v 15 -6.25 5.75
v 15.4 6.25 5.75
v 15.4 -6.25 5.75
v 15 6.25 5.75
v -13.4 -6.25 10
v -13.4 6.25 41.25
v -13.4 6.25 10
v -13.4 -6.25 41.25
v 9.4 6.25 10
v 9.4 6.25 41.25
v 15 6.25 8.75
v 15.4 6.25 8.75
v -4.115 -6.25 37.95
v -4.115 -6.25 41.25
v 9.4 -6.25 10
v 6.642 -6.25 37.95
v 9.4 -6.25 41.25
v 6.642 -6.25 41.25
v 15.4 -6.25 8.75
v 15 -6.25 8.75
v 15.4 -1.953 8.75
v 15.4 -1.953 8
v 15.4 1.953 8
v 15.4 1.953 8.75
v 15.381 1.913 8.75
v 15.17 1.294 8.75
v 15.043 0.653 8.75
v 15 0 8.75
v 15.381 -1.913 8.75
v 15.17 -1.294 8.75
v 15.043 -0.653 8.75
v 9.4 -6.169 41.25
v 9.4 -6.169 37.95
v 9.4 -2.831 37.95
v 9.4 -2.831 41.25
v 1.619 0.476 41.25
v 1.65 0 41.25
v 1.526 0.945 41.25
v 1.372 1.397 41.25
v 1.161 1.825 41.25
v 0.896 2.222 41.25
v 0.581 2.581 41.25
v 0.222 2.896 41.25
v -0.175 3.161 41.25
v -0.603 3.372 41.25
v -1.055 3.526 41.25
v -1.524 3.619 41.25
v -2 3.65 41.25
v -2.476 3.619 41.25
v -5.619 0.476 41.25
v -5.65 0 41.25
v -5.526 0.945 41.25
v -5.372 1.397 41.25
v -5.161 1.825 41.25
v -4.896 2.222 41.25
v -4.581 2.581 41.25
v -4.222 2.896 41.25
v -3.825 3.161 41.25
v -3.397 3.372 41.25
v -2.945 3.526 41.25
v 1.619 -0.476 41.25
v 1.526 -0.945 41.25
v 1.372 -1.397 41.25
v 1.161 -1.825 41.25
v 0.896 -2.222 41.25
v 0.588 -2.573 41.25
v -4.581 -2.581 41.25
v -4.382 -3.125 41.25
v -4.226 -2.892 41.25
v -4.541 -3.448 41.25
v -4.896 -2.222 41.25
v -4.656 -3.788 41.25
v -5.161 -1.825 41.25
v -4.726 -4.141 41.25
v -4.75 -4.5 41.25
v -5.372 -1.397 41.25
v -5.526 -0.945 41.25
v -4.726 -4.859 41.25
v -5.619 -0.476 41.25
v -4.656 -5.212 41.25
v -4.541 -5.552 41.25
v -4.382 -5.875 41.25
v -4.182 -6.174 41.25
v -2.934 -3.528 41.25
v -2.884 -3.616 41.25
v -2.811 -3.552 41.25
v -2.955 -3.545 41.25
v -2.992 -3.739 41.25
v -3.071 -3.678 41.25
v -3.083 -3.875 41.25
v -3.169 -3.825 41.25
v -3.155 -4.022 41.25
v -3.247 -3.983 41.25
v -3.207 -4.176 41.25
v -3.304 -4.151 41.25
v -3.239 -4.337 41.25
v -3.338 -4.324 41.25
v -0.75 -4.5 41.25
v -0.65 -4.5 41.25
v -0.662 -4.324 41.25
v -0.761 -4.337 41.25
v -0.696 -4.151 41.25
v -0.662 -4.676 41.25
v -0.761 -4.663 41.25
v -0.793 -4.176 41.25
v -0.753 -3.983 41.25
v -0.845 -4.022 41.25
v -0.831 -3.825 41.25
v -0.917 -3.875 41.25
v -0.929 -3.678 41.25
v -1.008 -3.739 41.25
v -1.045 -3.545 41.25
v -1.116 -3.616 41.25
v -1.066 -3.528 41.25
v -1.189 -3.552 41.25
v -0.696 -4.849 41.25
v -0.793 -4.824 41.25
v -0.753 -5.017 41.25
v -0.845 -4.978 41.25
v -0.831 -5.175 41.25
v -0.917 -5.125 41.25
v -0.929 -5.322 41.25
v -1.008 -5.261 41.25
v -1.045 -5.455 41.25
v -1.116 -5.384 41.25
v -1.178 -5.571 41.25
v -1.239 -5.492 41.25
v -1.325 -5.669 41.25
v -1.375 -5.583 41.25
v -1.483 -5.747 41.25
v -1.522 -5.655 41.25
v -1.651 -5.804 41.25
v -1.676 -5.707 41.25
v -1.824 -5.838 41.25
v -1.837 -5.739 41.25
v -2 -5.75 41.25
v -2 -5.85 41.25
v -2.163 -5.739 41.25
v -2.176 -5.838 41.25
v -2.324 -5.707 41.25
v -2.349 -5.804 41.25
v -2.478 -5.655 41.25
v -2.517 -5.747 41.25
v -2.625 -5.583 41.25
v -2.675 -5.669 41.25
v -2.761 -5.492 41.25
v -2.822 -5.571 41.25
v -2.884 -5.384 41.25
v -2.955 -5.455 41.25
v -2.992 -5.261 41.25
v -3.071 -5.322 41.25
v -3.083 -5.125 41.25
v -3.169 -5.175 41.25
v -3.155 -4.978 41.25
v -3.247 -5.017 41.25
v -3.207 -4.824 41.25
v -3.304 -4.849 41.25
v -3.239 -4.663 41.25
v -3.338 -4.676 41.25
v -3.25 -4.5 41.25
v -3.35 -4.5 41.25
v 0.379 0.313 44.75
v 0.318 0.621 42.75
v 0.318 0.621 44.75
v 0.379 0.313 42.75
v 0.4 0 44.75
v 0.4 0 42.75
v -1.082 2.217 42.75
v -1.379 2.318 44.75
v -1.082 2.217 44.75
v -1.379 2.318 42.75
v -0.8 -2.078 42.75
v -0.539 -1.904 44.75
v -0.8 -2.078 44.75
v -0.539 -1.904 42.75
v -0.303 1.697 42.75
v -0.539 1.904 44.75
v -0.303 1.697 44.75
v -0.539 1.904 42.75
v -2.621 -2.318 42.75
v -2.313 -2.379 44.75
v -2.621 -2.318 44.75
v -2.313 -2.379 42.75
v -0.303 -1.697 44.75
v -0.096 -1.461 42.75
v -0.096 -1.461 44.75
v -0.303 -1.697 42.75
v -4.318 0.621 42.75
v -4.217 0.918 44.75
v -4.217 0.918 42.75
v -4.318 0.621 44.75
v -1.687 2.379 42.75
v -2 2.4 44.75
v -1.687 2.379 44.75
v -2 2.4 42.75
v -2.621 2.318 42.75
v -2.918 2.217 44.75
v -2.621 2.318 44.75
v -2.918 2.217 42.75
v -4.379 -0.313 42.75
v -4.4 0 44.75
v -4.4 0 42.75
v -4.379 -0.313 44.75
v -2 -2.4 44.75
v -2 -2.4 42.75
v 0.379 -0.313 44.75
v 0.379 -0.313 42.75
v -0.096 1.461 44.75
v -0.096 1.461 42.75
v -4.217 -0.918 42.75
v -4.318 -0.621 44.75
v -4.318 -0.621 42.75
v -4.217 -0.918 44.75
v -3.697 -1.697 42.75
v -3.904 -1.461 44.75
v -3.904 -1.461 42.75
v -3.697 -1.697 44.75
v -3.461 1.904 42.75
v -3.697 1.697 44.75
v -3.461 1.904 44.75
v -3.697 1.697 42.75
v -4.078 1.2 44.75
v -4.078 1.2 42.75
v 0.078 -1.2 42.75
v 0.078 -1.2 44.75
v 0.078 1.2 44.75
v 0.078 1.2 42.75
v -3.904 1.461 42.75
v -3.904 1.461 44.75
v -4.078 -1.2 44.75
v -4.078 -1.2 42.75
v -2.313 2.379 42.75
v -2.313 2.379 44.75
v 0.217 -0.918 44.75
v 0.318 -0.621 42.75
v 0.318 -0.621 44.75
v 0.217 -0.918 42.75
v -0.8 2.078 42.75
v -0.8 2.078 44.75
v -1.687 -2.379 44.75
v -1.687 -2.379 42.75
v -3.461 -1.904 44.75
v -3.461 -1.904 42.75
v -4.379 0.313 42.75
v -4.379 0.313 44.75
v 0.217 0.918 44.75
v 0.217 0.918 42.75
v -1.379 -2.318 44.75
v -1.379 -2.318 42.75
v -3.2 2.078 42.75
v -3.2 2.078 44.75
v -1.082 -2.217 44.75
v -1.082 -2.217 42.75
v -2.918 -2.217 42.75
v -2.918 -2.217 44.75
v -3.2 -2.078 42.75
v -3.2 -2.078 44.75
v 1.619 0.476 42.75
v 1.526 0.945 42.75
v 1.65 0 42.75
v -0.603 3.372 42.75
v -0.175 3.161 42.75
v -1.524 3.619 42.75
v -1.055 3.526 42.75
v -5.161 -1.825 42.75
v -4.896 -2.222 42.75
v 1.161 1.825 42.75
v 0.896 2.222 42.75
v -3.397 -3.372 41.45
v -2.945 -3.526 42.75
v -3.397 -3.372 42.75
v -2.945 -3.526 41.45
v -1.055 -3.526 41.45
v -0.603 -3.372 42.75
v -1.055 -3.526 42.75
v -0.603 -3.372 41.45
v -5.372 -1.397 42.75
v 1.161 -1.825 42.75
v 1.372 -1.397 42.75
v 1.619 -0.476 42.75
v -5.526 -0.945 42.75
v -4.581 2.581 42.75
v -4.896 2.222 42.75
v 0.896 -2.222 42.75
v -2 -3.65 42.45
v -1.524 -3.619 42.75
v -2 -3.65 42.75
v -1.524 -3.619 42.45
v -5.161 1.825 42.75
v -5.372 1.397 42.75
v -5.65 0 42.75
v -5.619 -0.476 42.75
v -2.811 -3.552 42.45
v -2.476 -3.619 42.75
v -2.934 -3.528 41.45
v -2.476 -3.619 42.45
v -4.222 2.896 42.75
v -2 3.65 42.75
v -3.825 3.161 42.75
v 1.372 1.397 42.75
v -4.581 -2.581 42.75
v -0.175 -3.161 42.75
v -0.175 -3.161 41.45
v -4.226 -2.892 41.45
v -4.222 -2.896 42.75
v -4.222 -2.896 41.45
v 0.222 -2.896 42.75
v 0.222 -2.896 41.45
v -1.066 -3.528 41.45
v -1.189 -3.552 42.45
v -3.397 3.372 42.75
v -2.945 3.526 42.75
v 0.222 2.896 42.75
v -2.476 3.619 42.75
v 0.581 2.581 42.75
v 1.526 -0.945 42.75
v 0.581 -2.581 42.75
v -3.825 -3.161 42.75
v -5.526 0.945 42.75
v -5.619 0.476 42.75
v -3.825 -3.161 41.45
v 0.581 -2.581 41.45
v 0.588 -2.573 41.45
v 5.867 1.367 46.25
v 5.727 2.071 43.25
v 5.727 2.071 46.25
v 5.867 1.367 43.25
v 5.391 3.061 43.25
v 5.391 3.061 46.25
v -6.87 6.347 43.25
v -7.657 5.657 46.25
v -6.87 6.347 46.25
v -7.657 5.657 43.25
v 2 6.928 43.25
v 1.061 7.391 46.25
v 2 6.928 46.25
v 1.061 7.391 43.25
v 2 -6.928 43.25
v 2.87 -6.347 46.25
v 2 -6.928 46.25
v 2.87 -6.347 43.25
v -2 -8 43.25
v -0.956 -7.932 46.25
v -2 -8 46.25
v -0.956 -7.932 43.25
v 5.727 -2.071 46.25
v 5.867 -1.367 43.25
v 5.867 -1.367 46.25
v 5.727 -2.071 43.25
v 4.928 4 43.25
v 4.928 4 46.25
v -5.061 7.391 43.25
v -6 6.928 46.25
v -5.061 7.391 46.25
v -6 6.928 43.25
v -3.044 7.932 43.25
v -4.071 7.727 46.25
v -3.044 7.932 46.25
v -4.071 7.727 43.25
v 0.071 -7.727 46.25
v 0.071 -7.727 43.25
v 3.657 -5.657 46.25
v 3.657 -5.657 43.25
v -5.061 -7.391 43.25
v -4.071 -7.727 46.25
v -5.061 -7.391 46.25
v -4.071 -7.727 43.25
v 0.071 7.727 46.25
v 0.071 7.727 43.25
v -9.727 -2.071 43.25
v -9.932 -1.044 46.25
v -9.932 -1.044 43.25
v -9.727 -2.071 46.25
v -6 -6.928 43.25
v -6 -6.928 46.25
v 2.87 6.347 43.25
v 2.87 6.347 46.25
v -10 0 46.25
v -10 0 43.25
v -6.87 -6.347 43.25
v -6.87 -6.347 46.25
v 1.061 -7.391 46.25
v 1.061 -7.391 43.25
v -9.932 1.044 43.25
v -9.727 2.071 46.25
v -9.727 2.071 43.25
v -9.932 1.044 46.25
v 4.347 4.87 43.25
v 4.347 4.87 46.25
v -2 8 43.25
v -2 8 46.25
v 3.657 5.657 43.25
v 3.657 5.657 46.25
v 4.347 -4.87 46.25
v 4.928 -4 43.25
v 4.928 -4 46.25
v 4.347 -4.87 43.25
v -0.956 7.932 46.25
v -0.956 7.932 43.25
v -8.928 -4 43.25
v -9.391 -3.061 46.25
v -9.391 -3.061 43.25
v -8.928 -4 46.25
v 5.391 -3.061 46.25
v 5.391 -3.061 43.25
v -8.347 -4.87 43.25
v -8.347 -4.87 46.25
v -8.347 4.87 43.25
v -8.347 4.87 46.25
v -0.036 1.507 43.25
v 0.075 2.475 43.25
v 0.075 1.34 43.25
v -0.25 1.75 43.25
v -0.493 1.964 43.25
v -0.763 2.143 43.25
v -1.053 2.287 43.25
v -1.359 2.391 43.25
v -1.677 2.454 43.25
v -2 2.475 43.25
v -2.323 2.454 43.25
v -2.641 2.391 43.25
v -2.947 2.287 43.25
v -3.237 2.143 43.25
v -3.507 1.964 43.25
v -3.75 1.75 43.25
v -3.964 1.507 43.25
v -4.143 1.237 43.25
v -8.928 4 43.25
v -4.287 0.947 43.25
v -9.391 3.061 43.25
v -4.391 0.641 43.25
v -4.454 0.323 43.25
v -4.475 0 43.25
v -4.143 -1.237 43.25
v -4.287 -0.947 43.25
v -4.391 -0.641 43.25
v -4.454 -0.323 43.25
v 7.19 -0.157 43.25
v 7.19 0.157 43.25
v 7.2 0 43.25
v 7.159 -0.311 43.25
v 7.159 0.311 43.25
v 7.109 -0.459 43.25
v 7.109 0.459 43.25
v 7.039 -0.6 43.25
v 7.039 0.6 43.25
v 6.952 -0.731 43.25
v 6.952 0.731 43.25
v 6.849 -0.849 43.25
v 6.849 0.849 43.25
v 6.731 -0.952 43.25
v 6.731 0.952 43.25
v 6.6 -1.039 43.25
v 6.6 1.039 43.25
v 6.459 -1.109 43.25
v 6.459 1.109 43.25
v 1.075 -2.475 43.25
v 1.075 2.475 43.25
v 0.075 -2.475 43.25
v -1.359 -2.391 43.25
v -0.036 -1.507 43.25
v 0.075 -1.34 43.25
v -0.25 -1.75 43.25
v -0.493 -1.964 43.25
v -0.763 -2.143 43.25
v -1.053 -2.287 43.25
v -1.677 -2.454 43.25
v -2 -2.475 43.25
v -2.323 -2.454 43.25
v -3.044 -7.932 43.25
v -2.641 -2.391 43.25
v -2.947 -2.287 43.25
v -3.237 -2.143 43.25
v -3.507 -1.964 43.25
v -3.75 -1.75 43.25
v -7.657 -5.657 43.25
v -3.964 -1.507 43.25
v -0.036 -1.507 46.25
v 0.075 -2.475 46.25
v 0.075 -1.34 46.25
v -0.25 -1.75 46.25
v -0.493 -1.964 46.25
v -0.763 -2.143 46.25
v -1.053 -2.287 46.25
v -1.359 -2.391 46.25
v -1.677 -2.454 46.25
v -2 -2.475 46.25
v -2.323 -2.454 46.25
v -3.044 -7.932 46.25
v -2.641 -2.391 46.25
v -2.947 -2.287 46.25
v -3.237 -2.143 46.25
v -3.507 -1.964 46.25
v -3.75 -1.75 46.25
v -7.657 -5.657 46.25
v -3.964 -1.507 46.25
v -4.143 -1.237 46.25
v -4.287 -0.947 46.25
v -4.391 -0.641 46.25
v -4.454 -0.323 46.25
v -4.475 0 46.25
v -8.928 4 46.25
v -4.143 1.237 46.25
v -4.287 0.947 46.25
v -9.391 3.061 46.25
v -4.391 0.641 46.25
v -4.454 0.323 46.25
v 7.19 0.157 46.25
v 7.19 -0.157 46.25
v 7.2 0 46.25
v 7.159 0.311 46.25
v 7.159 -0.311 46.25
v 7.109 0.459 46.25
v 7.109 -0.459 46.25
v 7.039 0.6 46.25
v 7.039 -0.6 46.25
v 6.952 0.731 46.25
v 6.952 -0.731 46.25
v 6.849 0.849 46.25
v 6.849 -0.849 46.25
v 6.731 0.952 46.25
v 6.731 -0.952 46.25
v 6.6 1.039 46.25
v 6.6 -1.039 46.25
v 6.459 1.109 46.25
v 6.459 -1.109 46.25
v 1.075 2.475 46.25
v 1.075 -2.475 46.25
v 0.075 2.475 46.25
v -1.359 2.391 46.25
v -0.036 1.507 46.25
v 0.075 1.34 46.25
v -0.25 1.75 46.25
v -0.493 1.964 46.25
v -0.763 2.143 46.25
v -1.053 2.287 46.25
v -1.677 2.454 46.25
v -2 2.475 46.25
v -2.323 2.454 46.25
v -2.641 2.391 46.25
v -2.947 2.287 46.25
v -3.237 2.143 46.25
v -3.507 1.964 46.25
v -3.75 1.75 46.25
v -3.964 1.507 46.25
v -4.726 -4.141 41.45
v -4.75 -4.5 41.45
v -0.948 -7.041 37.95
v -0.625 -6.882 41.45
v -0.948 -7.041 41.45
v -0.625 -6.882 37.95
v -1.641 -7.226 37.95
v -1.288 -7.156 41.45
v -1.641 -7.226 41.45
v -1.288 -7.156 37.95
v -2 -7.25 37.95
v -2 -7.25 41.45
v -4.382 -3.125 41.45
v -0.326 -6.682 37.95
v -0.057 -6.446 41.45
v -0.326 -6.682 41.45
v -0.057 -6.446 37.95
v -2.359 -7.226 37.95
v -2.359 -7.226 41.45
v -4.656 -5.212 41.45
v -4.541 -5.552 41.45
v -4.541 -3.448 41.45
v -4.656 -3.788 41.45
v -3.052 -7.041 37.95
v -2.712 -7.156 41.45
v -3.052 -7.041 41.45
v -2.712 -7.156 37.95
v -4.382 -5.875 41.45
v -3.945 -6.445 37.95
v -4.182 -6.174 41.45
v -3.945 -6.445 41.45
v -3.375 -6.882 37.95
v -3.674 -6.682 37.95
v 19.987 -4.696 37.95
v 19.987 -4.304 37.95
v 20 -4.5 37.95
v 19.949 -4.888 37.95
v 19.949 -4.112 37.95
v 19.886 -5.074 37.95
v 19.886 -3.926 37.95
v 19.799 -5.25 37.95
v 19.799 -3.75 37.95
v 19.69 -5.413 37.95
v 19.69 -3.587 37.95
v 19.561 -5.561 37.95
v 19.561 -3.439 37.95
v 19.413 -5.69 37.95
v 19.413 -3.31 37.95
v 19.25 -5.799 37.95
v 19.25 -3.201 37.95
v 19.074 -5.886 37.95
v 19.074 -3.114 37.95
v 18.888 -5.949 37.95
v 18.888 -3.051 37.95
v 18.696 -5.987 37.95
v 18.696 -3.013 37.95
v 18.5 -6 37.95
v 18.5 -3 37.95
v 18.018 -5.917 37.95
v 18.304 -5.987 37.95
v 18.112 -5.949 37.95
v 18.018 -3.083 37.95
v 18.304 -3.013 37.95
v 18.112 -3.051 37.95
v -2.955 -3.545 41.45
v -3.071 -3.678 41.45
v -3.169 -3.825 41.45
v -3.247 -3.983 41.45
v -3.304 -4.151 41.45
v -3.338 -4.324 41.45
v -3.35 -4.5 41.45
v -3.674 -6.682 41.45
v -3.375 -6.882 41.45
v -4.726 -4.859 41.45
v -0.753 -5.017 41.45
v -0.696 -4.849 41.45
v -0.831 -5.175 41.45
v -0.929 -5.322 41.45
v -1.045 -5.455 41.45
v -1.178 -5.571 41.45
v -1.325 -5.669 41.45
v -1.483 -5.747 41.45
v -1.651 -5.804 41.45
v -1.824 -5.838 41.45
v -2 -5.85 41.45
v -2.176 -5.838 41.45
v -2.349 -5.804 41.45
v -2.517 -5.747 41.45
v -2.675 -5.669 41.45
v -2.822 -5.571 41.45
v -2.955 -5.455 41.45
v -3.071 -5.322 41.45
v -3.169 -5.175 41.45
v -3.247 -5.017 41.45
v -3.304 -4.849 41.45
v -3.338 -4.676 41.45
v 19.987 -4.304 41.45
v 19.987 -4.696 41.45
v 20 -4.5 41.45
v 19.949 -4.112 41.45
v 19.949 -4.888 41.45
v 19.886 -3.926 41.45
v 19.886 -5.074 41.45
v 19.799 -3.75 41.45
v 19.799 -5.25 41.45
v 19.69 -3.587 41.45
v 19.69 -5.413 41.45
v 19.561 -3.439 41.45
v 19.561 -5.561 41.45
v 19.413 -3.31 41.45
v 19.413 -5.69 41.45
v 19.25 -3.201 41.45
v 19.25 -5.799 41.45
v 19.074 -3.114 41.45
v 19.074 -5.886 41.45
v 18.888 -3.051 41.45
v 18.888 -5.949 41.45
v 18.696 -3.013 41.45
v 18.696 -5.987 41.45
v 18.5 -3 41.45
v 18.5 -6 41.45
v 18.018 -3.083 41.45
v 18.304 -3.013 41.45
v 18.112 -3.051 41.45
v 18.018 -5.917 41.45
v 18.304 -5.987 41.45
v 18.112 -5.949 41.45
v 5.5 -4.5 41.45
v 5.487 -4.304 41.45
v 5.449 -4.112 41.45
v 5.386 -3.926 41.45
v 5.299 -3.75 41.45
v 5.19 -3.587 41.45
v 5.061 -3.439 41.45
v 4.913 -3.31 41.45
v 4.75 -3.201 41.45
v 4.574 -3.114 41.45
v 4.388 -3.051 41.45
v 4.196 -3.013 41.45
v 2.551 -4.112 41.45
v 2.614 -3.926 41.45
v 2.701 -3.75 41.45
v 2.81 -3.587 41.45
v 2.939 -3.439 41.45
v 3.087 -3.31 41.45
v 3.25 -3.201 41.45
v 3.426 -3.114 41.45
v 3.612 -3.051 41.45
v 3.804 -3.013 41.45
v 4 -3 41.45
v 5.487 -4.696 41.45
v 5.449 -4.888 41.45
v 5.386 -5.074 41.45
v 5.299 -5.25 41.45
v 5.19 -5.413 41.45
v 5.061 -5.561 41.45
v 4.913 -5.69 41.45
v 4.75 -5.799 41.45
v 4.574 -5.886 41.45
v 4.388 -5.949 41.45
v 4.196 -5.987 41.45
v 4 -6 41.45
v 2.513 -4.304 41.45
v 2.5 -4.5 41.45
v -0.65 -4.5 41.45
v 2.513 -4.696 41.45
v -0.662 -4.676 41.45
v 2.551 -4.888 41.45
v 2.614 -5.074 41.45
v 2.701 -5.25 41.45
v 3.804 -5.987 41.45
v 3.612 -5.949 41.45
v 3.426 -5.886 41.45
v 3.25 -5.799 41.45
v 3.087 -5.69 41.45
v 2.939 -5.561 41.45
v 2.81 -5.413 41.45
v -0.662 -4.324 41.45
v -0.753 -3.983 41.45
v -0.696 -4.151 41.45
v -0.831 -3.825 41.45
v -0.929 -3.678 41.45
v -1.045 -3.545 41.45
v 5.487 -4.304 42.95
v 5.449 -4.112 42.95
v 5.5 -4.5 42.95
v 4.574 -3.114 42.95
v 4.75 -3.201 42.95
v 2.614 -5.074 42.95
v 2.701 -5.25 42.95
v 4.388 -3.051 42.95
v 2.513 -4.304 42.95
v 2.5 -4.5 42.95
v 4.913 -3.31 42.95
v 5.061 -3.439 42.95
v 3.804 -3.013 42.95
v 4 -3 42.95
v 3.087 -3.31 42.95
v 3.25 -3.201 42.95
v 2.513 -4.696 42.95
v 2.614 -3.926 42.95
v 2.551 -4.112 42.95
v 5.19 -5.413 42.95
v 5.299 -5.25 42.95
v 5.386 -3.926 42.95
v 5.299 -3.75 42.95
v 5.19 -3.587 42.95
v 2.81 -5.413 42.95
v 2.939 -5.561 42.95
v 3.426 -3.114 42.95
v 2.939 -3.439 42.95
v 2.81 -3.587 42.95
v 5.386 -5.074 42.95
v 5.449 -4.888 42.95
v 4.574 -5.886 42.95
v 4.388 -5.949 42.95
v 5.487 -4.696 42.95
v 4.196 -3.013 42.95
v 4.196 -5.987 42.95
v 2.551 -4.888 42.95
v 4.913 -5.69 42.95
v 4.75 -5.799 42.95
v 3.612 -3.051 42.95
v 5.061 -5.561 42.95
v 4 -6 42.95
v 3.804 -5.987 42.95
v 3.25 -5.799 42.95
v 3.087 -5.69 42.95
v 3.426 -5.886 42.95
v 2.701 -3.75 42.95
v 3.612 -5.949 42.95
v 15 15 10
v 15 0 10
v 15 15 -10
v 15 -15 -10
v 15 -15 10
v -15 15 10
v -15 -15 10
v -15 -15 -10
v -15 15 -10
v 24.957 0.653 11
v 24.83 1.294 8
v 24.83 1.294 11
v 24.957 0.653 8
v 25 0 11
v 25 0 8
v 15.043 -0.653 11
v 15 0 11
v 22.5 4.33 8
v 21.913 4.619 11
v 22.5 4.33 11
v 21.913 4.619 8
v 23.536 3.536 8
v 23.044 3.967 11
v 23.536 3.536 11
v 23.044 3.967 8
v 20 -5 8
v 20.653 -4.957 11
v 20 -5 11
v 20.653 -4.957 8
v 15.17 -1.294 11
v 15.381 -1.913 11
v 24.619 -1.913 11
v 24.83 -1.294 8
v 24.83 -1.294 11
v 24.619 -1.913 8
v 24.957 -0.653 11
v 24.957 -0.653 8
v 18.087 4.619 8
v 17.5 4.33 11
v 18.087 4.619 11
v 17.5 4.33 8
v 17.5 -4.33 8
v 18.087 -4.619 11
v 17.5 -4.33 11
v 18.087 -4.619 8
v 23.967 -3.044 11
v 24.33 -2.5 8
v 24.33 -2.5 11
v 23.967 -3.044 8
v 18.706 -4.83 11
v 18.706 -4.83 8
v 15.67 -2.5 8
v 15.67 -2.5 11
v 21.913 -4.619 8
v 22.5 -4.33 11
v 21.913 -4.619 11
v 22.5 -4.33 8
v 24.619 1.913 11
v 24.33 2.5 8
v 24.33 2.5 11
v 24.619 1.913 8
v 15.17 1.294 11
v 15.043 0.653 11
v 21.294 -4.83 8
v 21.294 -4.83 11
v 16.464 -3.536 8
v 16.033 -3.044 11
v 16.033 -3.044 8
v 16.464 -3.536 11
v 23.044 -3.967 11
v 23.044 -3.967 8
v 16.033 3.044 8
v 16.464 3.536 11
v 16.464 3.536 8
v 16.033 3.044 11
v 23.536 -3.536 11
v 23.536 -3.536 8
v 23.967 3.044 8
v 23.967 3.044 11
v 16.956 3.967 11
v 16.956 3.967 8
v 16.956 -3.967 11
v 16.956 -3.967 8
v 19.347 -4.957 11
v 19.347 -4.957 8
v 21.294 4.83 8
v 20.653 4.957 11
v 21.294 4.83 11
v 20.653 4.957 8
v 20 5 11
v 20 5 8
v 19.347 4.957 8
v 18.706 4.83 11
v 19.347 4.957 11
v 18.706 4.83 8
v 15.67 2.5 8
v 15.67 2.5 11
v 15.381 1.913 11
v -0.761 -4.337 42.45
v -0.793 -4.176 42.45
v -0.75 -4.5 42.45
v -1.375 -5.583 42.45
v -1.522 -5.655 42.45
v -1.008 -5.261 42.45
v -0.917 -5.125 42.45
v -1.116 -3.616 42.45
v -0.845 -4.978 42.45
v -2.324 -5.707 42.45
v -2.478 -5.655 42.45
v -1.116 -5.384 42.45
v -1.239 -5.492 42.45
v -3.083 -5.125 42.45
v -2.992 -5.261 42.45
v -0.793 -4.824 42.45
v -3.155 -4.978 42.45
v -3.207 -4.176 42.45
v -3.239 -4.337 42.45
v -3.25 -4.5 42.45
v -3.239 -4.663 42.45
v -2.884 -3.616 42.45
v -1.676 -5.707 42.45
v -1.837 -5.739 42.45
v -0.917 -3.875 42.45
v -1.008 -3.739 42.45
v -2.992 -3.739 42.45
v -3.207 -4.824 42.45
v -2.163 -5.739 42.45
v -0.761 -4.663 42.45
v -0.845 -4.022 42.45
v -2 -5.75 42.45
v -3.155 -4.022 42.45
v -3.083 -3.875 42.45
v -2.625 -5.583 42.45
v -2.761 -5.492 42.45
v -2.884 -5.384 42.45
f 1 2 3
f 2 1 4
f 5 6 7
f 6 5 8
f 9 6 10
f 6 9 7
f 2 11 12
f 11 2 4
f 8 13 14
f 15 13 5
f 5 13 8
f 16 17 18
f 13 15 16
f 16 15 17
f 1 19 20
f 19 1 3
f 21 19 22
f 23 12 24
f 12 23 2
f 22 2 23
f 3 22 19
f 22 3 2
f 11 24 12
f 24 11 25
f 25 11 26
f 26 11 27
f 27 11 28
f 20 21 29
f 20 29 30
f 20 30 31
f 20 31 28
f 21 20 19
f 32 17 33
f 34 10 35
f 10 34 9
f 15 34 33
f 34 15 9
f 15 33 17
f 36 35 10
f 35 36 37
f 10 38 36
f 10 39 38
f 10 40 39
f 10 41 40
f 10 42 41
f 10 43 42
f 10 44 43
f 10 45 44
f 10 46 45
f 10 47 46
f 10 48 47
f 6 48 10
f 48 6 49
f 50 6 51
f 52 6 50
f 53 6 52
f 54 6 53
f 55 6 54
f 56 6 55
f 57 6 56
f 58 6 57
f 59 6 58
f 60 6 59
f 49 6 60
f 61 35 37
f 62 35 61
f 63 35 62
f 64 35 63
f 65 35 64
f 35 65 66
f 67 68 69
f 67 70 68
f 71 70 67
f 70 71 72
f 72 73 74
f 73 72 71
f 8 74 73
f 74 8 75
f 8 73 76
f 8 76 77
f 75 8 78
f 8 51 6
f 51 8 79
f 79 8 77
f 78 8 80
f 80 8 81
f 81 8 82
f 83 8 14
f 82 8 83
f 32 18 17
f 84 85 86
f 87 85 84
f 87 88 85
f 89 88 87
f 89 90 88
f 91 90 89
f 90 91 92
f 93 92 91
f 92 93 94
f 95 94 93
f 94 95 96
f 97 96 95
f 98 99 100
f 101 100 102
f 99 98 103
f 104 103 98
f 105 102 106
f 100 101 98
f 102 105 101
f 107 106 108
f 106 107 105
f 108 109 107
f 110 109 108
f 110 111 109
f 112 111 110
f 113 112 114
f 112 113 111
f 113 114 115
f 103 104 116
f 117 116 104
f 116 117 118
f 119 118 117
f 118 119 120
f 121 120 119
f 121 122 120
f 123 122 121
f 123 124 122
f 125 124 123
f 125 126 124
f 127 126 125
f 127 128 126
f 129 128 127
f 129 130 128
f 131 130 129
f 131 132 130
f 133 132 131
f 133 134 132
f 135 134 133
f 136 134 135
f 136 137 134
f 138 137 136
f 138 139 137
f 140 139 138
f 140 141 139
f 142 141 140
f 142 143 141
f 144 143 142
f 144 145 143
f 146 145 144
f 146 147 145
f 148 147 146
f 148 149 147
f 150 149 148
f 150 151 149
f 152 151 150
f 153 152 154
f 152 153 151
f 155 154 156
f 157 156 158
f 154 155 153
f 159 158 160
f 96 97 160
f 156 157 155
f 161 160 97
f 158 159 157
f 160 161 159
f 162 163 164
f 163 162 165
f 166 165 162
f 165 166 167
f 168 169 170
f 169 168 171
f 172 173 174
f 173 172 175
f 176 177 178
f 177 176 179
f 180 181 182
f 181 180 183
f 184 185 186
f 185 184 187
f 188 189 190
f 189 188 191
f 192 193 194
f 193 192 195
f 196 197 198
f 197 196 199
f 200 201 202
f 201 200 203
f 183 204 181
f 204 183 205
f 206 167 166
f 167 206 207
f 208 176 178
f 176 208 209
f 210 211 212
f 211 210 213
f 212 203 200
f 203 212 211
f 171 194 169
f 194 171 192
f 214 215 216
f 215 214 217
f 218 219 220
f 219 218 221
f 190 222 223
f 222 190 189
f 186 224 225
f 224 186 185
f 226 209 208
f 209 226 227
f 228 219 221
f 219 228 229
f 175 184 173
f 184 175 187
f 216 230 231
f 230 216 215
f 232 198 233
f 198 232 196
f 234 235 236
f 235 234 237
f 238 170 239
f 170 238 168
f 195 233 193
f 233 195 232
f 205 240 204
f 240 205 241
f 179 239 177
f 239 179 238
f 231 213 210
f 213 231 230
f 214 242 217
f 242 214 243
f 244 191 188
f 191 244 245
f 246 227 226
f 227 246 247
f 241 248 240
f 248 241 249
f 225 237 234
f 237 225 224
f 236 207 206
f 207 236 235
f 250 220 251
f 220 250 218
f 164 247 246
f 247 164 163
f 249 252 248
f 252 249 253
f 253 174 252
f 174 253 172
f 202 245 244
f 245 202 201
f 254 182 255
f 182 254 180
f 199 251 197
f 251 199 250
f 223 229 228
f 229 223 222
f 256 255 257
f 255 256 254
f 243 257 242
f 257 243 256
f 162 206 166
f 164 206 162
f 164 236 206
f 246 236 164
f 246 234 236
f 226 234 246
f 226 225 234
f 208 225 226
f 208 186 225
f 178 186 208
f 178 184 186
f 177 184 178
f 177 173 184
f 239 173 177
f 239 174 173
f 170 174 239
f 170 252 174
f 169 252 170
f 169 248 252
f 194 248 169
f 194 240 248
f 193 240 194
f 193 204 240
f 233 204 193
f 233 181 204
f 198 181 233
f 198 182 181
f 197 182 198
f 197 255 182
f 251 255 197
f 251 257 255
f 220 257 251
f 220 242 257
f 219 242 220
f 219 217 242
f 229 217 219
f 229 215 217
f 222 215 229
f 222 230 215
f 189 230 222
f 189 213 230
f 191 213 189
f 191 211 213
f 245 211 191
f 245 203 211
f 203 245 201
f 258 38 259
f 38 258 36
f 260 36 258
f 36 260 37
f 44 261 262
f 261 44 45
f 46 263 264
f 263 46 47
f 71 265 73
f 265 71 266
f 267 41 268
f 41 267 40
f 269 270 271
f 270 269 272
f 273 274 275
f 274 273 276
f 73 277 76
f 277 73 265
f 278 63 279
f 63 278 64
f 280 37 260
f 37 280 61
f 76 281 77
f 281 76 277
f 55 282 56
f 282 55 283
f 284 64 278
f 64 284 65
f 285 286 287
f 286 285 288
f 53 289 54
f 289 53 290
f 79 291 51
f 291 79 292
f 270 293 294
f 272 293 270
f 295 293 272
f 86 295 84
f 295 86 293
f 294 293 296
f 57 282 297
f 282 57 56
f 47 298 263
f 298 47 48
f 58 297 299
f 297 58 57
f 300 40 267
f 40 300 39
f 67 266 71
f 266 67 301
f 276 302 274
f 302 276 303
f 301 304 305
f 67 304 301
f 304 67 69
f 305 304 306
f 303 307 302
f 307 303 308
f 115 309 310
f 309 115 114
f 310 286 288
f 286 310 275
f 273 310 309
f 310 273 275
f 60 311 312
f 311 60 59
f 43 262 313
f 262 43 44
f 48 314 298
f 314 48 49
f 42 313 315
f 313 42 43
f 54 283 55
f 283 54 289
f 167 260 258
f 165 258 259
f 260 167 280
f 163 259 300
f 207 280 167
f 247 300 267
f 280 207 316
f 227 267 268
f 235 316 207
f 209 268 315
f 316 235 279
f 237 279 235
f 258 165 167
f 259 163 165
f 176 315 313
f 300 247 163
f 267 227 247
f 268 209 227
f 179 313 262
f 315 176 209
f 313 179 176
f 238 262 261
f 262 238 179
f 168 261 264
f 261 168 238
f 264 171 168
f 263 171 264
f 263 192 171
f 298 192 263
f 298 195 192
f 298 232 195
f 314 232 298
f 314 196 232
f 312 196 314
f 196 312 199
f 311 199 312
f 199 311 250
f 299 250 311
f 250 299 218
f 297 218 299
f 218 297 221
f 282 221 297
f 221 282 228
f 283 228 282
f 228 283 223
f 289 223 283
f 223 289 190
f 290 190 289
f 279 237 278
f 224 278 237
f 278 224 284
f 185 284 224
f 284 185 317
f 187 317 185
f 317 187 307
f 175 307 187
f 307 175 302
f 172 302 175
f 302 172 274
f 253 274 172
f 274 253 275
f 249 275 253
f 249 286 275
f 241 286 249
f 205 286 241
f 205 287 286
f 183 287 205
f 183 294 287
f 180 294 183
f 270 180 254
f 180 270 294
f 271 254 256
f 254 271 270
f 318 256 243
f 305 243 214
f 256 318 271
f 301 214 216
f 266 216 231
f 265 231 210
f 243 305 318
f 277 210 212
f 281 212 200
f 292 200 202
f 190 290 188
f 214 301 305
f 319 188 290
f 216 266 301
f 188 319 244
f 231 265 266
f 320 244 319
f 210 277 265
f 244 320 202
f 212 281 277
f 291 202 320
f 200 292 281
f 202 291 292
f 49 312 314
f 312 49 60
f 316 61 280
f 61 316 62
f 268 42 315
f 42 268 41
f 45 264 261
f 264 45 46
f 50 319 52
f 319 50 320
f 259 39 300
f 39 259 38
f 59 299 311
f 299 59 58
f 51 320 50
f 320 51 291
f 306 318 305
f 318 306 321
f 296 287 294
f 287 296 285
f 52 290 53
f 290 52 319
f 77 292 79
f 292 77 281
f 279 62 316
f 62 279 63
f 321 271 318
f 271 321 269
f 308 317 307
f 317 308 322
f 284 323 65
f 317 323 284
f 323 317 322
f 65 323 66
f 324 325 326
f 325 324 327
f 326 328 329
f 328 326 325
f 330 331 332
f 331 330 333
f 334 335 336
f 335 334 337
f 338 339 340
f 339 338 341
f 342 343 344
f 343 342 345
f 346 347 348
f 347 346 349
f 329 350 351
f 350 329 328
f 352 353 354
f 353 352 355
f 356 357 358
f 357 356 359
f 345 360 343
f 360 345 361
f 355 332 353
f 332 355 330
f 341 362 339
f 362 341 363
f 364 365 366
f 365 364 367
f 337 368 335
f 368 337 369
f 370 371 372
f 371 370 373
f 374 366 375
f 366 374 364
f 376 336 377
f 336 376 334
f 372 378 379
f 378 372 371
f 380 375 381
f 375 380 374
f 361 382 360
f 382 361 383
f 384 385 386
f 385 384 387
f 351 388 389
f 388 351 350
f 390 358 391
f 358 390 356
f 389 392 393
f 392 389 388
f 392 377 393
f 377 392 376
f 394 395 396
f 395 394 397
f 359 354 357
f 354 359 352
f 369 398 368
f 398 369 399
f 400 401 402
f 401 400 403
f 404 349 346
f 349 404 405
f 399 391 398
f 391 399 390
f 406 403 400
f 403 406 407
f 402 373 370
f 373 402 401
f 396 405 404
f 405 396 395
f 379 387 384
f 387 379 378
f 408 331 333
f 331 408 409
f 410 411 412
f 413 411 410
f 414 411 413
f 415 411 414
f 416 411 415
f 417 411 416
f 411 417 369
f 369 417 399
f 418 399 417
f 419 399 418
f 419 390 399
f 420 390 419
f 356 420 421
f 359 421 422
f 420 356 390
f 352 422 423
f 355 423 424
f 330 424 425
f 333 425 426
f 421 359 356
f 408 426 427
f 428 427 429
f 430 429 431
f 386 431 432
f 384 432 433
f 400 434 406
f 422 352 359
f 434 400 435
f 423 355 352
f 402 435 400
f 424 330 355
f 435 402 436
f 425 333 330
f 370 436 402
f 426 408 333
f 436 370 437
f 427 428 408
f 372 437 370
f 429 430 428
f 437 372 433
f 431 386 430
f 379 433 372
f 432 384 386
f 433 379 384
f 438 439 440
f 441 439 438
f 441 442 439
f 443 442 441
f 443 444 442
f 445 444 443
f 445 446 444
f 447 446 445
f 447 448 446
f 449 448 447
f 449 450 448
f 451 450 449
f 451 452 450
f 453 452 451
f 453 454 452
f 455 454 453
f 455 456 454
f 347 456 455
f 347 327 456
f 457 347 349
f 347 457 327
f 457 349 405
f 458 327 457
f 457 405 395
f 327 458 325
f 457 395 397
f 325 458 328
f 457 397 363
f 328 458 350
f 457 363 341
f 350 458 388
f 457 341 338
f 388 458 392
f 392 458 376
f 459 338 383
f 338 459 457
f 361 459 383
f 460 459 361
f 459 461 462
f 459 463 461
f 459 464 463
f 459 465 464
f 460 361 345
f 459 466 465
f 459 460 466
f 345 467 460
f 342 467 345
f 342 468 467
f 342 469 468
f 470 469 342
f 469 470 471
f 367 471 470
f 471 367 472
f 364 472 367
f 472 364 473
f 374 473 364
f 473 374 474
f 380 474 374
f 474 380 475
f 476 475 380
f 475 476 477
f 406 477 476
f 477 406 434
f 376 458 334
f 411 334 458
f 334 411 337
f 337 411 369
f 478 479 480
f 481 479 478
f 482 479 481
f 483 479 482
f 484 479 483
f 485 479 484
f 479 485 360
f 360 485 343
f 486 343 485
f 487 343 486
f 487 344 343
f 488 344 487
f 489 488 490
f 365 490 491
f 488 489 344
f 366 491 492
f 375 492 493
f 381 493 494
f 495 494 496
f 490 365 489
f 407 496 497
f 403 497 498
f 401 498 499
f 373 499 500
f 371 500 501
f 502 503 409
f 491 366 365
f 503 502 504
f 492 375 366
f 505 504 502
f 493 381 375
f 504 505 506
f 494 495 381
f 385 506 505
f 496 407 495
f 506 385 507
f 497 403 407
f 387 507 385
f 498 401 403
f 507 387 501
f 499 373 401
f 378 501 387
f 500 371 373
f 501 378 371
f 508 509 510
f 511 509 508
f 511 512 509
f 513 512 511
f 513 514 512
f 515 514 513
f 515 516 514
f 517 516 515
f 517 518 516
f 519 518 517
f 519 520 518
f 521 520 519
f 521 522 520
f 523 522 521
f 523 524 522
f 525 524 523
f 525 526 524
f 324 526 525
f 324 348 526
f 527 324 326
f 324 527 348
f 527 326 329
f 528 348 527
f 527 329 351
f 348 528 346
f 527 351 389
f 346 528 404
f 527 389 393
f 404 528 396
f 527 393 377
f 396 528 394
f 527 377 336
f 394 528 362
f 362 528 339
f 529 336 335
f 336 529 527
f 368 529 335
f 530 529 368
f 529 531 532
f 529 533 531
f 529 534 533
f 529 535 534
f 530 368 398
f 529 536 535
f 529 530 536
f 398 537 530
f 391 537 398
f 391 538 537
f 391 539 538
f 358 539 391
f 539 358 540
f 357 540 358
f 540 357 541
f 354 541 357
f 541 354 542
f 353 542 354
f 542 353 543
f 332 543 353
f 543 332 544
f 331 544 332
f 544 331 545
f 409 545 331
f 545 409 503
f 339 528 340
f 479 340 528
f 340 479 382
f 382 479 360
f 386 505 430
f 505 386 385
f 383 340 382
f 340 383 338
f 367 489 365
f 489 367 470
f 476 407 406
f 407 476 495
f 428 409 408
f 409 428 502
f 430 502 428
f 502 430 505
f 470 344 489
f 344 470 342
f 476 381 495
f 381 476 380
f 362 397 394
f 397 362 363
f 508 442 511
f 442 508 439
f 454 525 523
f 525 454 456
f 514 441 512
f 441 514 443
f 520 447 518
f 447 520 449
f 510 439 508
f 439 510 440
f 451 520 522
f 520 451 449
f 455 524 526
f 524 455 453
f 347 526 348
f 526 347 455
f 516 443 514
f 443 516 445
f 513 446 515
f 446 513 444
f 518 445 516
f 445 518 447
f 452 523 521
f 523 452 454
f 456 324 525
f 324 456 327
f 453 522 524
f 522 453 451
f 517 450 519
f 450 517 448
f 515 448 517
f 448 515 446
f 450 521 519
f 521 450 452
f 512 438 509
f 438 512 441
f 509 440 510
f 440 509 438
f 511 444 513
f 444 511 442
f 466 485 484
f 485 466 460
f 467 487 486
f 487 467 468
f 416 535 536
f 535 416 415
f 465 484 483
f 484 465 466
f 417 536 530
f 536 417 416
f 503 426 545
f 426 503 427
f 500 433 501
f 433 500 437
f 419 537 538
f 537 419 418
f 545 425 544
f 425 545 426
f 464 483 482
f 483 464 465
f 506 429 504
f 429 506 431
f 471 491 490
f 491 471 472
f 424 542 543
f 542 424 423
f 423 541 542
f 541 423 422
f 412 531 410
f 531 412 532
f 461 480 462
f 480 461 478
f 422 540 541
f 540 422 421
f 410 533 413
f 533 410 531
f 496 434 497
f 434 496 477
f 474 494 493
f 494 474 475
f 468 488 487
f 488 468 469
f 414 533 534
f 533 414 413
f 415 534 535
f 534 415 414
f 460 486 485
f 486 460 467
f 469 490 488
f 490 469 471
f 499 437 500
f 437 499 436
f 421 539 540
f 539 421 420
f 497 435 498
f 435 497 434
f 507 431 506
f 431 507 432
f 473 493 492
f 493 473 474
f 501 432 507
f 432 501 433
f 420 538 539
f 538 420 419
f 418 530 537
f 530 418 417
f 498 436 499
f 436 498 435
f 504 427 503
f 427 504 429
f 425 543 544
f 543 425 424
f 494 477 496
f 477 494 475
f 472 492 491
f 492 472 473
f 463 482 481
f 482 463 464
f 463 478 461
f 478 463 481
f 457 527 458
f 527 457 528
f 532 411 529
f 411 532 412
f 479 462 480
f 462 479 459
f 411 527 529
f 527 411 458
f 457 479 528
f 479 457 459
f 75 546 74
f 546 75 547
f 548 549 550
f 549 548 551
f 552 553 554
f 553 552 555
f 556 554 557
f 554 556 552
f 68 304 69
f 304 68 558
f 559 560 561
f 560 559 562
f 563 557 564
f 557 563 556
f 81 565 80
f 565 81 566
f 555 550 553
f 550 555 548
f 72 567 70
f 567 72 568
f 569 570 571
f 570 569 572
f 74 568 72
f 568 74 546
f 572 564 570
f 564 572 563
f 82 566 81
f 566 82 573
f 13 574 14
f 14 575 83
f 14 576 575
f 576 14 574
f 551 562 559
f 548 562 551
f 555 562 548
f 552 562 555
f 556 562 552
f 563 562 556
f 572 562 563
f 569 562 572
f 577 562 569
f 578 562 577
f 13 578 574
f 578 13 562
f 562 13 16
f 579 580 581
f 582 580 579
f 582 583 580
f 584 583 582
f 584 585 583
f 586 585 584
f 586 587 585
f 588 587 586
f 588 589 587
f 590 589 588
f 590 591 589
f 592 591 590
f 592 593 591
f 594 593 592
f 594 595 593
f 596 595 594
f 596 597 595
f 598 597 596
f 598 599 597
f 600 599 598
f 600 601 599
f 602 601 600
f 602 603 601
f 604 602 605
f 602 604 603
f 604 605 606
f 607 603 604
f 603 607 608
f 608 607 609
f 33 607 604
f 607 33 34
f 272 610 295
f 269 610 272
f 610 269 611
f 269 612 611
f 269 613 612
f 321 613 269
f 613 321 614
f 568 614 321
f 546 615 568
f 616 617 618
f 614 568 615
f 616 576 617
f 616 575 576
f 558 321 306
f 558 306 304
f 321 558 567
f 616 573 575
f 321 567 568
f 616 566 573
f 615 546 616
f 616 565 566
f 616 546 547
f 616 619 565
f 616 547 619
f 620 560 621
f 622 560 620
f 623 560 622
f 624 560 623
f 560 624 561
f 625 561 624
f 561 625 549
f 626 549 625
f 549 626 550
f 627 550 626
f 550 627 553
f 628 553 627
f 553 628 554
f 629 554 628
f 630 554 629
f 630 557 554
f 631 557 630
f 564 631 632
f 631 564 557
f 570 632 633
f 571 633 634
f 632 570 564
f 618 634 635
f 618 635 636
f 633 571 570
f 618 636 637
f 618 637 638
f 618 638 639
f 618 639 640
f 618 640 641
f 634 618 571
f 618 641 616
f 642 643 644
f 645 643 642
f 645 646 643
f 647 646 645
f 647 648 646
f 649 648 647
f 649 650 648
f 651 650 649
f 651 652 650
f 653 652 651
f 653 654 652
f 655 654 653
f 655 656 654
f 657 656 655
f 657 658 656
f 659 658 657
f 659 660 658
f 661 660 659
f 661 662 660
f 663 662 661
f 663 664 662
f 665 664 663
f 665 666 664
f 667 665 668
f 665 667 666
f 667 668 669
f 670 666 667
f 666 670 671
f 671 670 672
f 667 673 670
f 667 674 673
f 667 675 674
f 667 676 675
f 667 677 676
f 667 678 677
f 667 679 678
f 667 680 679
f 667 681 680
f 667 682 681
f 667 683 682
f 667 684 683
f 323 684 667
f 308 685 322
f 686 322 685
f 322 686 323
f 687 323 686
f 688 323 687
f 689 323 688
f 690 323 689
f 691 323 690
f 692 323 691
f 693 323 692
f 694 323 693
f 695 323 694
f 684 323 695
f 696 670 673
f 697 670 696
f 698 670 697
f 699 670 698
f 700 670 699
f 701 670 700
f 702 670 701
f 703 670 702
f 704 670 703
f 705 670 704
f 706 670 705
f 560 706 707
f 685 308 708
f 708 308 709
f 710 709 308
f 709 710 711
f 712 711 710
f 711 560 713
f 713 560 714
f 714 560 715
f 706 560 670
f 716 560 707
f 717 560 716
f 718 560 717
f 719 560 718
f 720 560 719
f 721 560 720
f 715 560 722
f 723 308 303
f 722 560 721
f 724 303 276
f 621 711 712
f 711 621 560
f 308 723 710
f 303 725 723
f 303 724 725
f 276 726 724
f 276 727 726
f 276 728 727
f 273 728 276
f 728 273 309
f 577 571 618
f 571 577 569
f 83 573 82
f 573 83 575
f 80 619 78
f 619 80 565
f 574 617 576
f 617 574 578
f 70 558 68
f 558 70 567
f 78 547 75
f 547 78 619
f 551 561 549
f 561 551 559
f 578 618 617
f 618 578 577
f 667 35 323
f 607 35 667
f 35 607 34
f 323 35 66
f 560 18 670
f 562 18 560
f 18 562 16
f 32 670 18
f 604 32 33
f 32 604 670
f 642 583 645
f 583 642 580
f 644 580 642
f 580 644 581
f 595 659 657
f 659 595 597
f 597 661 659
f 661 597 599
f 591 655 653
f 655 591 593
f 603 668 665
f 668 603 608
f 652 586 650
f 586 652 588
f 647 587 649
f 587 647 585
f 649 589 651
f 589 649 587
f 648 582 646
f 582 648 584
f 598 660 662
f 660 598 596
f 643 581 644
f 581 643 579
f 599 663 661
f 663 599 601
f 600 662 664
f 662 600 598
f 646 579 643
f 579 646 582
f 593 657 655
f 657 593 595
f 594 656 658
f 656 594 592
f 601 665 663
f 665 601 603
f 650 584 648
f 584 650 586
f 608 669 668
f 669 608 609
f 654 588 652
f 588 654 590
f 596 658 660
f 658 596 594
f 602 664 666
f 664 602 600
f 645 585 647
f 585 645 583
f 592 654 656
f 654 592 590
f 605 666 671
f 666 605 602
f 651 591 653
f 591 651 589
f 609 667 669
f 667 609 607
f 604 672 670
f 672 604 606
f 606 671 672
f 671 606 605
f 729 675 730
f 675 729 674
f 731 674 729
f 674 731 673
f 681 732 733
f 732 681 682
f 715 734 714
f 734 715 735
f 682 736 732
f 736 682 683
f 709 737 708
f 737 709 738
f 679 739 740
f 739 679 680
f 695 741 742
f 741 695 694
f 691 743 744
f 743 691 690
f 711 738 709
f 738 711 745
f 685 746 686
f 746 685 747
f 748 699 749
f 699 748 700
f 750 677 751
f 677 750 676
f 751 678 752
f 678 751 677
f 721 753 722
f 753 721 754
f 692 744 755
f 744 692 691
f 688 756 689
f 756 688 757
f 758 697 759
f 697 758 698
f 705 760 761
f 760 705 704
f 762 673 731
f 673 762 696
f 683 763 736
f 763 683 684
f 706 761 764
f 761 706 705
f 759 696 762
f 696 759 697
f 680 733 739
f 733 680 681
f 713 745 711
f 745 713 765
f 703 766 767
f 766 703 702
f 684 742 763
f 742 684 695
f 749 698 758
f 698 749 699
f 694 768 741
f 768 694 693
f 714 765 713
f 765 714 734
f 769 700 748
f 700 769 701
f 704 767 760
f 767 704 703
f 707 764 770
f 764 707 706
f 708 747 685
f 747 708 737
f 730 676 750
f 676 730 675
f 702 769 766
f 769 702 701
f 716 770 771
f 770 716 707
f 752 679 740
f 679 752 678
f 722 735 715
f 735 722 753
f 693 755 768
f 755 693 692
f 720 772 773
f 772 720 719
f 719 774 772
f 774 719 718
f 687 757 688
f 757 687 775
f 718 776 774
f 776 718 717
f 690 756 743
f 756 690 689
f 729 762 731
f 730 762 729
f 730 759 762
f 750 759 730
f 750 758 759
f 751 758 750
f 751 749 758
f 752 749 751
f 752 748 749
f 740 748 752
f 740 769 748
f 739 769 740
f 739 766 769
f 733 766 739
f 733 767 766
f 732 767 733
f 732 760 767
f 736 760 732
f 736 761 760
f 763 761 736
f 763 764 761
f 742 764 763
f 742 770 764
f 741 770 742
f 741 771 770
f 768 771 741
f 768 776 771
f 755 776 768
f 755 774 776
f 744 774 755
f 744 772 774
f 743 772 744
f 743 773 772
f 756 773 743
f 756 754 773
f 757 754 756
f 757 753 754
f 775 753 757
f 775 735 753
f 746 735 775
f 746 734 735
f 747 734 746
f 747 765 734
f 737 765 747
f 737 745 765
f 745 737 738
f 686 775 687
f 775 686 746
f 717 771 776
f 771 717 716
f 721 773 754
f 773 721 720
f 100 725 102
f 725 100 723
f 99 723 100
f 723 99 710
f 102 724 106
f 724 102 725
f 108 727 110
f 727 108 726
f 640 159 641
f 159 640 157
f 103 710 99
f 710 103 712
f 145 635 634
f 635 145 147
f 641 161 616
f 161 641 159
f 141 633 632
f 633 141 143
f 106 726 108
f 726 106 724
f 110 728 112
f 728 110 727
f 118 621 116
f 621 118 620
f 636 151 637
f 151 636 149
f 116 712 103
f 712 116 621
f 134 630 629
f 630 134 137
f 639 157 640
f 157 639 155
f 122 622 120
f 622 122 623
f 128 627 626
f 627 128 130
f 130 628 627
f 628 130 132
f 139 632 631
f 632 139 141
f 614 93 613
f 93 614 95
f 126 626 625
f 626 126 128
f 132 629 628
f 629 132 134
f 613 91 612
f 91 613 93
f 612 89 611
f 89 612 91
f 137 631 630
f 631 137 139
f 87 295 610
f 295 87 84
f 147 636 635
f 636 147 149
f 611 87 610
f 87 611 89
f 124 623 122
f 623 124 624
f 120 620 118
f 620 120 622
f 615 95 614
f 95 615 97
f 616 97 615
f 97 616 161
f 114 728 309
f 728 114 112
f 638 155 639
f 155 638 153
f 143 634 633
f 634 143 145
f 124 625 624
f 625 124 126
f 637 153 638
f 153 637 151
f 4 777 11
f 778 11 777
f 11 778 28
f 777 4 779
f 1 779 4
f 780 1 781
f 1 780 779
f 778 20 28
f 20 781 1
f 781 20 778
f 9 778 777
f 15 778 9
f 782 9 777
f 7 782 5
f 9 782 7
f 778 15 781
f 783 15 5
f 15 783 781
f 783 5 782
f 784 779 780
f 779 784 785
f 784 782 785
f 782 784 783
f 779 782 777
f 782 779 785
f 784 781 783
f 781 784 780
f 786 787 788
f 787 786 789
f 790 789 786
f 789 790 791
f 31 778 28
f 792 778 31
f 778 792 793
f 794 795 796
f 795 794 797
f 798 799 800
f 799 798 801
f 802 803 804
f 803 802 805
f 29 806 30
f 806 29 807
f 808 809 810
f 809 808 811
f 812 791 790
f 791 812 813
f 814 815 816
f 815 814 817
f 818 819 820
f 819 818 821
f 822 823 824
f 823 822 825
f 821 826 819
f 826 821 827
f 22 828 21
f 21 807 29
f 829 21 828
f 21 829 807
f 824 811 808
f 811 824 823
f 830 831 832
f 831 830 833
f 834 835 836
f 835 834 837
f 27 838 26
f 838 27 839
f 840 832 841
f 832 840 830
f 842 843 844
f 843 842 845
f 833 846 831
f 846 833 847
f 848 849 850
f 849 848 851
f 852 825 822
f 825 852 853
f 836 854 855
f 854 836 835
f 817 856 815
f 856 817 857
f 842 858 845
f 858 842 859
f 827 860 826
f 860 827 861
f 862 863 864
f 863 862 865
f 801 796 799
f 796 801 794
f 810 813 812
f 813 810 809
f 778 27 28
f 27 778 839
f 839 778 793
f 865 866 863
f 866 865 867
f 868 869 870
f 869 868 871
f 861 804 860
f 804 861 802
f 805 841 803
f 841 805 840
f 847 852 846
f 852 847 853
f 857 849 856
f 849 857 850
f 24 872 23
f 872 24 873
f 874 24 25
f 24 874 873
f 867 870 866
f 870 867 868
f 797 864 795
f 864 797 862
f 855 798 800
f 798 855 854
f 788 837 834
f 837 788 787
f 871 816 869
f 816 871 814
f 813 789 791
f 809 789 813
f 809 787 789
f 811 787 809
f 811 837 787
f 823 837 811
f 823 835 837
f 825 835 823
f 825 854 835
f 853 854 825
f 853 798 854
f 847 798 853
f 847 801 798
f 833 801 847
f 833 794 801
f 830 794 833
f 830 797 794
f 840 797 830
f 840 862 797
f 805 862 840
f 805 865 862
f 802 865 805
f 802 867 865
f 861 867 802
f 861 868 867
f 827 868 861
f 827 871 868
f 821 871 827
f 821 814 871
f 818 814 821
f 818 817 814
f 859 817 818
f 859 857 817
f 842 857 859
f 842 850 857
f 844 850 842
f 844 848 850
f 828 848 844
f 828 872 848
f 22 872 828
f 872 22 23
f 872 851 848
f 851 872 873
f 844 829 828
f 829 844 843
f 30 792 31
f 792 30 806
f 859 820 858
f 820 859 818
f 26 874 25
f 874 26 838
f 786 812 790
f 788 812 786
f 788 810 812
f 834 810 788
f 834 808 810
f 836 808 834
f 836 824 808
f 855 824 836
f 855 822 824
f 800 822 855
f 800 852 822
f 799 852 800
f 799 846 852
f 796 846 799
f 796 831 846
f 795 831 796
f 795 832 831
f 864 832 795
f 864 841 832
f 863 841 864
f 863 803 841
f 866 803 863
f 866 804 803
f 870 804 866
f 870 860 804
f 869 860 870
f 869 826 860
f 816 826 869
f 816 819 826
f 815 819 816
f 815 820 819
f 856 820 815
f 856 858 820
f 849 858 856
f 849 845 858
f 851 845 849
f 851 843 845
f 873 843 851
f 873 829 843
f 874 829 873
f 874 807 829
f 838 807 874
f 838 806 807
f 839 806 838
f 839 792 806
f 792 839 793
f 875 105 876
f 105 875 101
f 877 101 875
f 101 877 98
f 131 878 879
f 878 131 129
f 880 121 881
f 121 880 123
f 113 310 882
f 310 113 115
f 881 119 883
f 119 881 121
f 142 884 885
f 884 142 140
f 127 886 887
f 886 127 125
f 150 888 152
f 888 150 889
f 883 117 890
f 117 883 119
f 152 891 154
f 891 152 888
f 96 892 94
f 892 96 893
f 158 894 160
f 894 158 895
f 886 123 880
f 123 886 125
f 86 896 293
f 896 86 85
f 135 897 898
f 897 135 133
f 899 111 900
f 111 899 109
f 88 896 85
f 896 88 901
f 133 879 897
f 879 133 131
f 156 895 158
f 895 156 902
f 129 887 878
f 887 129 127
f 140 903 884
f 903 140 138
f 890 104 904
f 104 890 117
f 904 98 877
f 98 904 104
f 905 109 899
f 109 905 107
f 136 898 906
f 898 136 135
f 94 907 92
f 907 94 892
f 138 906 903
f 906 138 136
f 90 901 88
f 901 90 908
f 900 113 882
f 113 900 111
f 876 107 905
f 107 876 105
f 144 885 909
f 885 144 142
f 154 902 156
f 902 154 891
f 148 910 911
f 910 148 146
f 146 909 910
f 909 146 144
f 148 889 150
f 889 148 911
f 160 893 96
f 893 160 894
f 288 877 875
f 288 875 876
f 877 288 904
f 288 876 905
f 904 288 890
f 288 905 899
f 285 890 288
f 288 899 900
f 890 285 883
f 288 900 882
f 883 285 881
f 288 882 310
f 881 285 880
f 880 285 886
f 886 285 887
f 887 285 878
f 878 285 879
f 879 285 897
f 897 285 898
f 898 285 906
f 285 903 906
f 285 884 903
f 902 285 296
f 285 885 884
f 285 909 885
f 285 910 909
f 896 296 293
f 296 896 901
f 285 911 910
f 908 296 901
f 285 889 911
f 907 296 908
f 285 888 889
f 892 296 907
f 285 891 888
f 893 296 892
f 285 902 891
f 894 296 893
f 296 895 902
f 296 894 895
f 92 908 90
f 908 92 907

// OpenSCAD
// release_lever.scad
// Magnetic-release lever mechanism for strut connector head.
//
// Peel geometry rationale:
//   A 10 mm N52 disc magnet (3 mm thick) can exert 3–5 N of direct pull force.
//   Fighting that force axially requires the servo to produce an equivalent linear
//   force over a very short stroke, which exceeds the MG90S torque budget at the
//   short moment arms available inside the 30×30×20 mm envelope.
//   Instead, a cam-driven lever tilts the magnet at one edge, peeling it off the
//   ferrous face. Peeling initiates separation at a single contact line and
//   propagates; the force required is typically 20–40% of the direct pull force.
//   The servo rotates the cam, the cam pushes the lever tip under the magnet edge,
//   and the lever pivots about a hinge pin — trading servo rotation for mechanical
//   advantage.

$fn = 48;

// ─────────────────────────────────────────────────────────────
//  PARAMETERS
// ─────────────────────────────────────────────────────────────

// MG90S servo body (bounding box, mm)
servo_body_w  = 22.8;   // X — width across the servo face
servo_body_d  = 12.5;   // Y — body depth (ear to ear not included)
servo_body_h  = 35.5;   // Z — full height including bottom mounting ears

// Servo output shaft
spline_d      = 4.8;    // diameter of 25T output spline (mm)
spline_h      = 3.5;    // exposed spline height above body top

// Cam / crank geometry (press-fit or screw-on servo horn replacement)
cam_radius    = 8.0;    // distance from spline center to cam lobe tip (mm)
cam_lobe_w    = 4.0;    // width of cam lobe (mm)
cam_thickness = 3.0;    // cam disk thickness (mm)
cam_bore_d    = spline_d + 0.15;  // light press-fit on spline

// Lever arm
lever_length    = 22.0;  // pivot-to-tip length (mm)
lever_thickness =  3.5;  // lever thickness in Z (mm)
lever_width     =  4.0;  // lever width in Y (mm)
lever_tip_r     =  1.5;  // rounded tip radius

// Hinge / pivot pin
hinge_pin_d   = 2.5;    // M2.5 pin or printed-in stub
hinge_wall    = 1.5;    // wall around pin bore

// Cam–lever interface
cam_follower_d = 3.0;   // diameter of the roller/nub on the lever that contacts the cam

// 10 mm N52 disc magnet
magnet_d      = 10.0;
magnet_h      =  3.0;
magnet_recess =  1.0;   // how deep the magnet sits below connector face

// Peel angle — lever tip lifts this many degrees at full stroke
peel_angle    = 18.0;   // deg; peeling starts well before full angle

// Connector head envelope (for reference / clearance checks)
envelope_x    = 30.0;
envelope_y    = 30.0;
envelope_z    = 20.0;

// Wall / structural thickness
wall_t        = 1.6;    // minimum printable wall (2 perimeters @ 0.4 mm nozzle)

// Servo mounting offset inside envelope
servo_x_offset = -(envelope_x/2 - servo_body_w/2 - wall_t);
servo_z_offset = -(envelope_z/2 - servo_body_h/2 + 2);

// ─────────────────────────────────────────────────────────────
//  MODULE: mg90s_servo_body
//  Simplified bounding-box placeholder for fit-checking.
//  NOT a detailed model — just the critical envelope + spline stub.
//  Overhang note: the real servo has no critical overhangs;
//  this placeholder is solid and prints trivially.
// ─────────────────────────────────────────────────────────────
module mg90s_servo_body() {
    color("DimGray", 0.7) {
        // Main body block
        translate([-servo_body_w/2, -servo_body_d/2, 0])
            cube([servo_body_w, servo_body_d, servo_body_h]);

        // Mounting ear tabs (simplified — flat flanges at Z=0)
        // Ears extend +/-6 mm in X at the bottom 3 mm
        for (sx = [-1, 1])
            translate([sx * (servo_body_w/2), -servo_body_d/2, 0])
                cube([6, servo_body_d, 3]);

        // Output spline stub on top
        translate([0, 0, servo_body_h])
            cylinder(d = spline_d, h = spline_h);

        // Small output shaft hub (visible collar)
        translate([0, 0, servo_body_h])
            cylinder(d = spline_d + 2.5, h = 1.5);
    }
}

// ─────────────────────────────────────────────────────────────
//  MODULE: release_cam
//  Disk cam that presses the lever when the servo rotates.
//  Sits on the servo spline (cam_bore_d press/clearance fit).
//
//  Geometry: circular disk of radius cam_radius with an
//  off-center lobe. At the neutral (latched) position the lobe
//  is retracted from the lever follower. Servo rotates ~peel_angle
//  to drive the lobe into the follower nub on the lever.
//
//  Overhang: cam is printed flat (cam_thickness in Z, disk in XY).
//  No overhangs. Spline bore needs support only if printed upright;
//  recommend printing lying flat.
// ─────────────────────────────────────────────────────────────
module release_cam() {
    color("SteelBlue") {
        difference() {
            union() {
                // Main cam disk
                cylinder(d = cam_radius * 2, h = cam_thickness);

                // Lobe: an eccentric bump that contacts the lever follower.
                // Placed at +X from the spline center.
                // Height of lobe above disk face = cam_follower_d / 2
                // so the lever follower rides up onto it smoothly.
                translate([cam_radius - cam_lobe_w/2, 0, 0])
                    hull() {
                        cylinder(d = cam_lobe_w, h = cam_thickness);
                        translate([cam_lobe_w/2, 0, 0])
                            cylinder(d = cam_lobe_w * 0.6, h = cam_thickness);
                    }
            }

            // Spline bore (light press-fit)
            translate([0, 0, -0.1])
                cylinder(d = cam_bore_d, h = cam_thickness + 0.2);

            // Anti-rotation flat (matches 25T spline flat side, simplified)
            translate([cam_bore_d/2 - 0.4, -cam_bore_d/2, -0.1])
                cube([1.0, cam_bore_d, cam_thickness + 0.2]);
        }
    }
}

// ─────────────────────────────────────────────────────────────
//  MODULE: release_lever
//  The lever arm. Pivots on a hinge pin at one end; the cam
//  follower nub sits near the pivot; the tip contacts the magnet
//  edge at the far end.
//
//  Coordinate convention (local):
//    Origin at hinge pin center.
//    Lever extends in +X.
//    Lever lies in XY plane; thickness in Z.
//
//  Overhang: lever printed lying flat — no overhangs.
//  Hinge knuckle has a 180° arc; print orientation should keep the
//  bore horizontal if unsupported (bridging ≤ hinge_pin_d ≈ 2.5 mm,
//  within FDM bridge capability).
//
//  The tip is a rounded wedge so it can slip under the magnet edge
//  without catching on the connector face chamfer.
// ─────────────────────────────────────────────────────────────
module release_lever() {
    color("Coral") {
        difference() {
            union() {
                // Hinge knuckle (thickened cylinder around pin bore)
                cylinder(d = hinge_pin_d + 2*hinge_wall, h = lever_thickness);

                // Main lever body — tapered slightly toward the tip for stiffness
                hull() {
                    // Root, near hinge
                    translate([0, -(lever_width/2), 0])
                        cube([0.1, lever_width, lever_thickness]);

                    // Tip, at lever_length
                    translate([lever_length - lever_tip_r, -(lever_width/2 * 0.7), 0])
                        cube([0.1, lever_width * 0.7, lever_thickness]);
                }

                // Rounded tip wedge (contacts magnet edge — thin leading edge)
                translate([lever_length - lever_tip_r, 0, 0])
                    cylinder(r = lever_tip_r, h = lever_thickness);

                // Cam follower nub — sits at cam_radius from spline center.
                // Positioned at X = (cam_radius - distance from hinge to spline)
                // For assembly the hinge is offset so this nub aligns with the cam lobe.
                translate([cam_radius - cam_lobe_w/2, 0, lever_thickness])
                    cylinder(d = cam_follower_d, h = cam_follower_d/2);
            }

            // Hinge pin bore
            translate([0, 0, -0.1])
                cylinder(d = hinge_pin_d + 0.2, h = lever_thickness + 0.2);
        }
    }
}

// ─────────────────────────────────────────────────────────────
//  MODULE: release_assembly
//  Shows all parts in the neutral (latched) position.
//  The magnet is shown as a red disk seated in the connector face.
//  The lever tip is just beneath the magnet edge — zero preload.
//  When the servo rotates +peel_angle, the cam lobe pushes the
//  follower nub, rotating the lever about its hinge pin, driving
//  the lever tip upward under the magnet edge and peeling it off.
//
//  Envelope reference box shown as a ghost outline.
// ─────────────────────────────────────────────────────────────
module release_assembly() {
    // ── Envelope ghost ──────────────────────────────────────
    color("LightGray", 0.12)
        translate([-envelope_x/2, -envelope_y/2, -envelope_z/2])
            cube([envelope_x, envelope_y, envelope_z]);

    // ── Servo body ──────────────────────────────────────────
    // Mounted at the back of the envelope, shaft pointing +Z (up).
    // Offset so the spline is near the cam centerline.
    translate([servo_x_offset, 0, servo_z_offset])
        mg90s_servo_body();

    // ── Cam (on spline) ─────────────────────────────────────
    // Z position: top of servo body + spline_h clearance so cam
    // clears the hub collar.
    cam_z = servo_z_offset + servo_body_h + spline_h - cam_thickness/2;
    translate([servo_x_offset, 0, cam_z])
        release_cam();

    // ── Lever ────────────────────────────────────────────────
    // Hinge pin is at the same X as the cam center so the follower
    // nub aligns with the cam lobe at the neutral position.
    // Lever extends toward the magnet (+X in world coords from here).
    hinge_x = servo_x_offset;
    hinge_y = -(lever_width/2 + cam_lobe_w/2 + 0.5); // clears cam in Y
    hinge_z = cam_z - cam_thickness/2 - lever_thickness - 0.3;

    translate([hinge_x, hinge_y, hinge_z])
        release_lever();

    // ── Magnet ───────────────────────────────────────────────
    // Seated in connector face (top of envelope, XY center offset to
    // align with lever tip).
    magnet_x = hinge_x + lever_length;
    color("Red", 0.8)
        translate([magnet_x, 0, envelope_z/2 - magnet_h + magnet_recess])
            cylinder(d = magnet_d, h = magnet_h);

    // ── Hinge pin (visual reference) ─────────────────────────
    color("Silver")
        translate([hinge_x, hinge_y, hinge_z - 1])
            cylinder(d = hinge_pin_d, h = lever_thickness + 2);
}

// ─────────────────────────────────────────────────────────────
//  RENDER
// ─────────────────────────────────────────────────────────────
release_assembly();
